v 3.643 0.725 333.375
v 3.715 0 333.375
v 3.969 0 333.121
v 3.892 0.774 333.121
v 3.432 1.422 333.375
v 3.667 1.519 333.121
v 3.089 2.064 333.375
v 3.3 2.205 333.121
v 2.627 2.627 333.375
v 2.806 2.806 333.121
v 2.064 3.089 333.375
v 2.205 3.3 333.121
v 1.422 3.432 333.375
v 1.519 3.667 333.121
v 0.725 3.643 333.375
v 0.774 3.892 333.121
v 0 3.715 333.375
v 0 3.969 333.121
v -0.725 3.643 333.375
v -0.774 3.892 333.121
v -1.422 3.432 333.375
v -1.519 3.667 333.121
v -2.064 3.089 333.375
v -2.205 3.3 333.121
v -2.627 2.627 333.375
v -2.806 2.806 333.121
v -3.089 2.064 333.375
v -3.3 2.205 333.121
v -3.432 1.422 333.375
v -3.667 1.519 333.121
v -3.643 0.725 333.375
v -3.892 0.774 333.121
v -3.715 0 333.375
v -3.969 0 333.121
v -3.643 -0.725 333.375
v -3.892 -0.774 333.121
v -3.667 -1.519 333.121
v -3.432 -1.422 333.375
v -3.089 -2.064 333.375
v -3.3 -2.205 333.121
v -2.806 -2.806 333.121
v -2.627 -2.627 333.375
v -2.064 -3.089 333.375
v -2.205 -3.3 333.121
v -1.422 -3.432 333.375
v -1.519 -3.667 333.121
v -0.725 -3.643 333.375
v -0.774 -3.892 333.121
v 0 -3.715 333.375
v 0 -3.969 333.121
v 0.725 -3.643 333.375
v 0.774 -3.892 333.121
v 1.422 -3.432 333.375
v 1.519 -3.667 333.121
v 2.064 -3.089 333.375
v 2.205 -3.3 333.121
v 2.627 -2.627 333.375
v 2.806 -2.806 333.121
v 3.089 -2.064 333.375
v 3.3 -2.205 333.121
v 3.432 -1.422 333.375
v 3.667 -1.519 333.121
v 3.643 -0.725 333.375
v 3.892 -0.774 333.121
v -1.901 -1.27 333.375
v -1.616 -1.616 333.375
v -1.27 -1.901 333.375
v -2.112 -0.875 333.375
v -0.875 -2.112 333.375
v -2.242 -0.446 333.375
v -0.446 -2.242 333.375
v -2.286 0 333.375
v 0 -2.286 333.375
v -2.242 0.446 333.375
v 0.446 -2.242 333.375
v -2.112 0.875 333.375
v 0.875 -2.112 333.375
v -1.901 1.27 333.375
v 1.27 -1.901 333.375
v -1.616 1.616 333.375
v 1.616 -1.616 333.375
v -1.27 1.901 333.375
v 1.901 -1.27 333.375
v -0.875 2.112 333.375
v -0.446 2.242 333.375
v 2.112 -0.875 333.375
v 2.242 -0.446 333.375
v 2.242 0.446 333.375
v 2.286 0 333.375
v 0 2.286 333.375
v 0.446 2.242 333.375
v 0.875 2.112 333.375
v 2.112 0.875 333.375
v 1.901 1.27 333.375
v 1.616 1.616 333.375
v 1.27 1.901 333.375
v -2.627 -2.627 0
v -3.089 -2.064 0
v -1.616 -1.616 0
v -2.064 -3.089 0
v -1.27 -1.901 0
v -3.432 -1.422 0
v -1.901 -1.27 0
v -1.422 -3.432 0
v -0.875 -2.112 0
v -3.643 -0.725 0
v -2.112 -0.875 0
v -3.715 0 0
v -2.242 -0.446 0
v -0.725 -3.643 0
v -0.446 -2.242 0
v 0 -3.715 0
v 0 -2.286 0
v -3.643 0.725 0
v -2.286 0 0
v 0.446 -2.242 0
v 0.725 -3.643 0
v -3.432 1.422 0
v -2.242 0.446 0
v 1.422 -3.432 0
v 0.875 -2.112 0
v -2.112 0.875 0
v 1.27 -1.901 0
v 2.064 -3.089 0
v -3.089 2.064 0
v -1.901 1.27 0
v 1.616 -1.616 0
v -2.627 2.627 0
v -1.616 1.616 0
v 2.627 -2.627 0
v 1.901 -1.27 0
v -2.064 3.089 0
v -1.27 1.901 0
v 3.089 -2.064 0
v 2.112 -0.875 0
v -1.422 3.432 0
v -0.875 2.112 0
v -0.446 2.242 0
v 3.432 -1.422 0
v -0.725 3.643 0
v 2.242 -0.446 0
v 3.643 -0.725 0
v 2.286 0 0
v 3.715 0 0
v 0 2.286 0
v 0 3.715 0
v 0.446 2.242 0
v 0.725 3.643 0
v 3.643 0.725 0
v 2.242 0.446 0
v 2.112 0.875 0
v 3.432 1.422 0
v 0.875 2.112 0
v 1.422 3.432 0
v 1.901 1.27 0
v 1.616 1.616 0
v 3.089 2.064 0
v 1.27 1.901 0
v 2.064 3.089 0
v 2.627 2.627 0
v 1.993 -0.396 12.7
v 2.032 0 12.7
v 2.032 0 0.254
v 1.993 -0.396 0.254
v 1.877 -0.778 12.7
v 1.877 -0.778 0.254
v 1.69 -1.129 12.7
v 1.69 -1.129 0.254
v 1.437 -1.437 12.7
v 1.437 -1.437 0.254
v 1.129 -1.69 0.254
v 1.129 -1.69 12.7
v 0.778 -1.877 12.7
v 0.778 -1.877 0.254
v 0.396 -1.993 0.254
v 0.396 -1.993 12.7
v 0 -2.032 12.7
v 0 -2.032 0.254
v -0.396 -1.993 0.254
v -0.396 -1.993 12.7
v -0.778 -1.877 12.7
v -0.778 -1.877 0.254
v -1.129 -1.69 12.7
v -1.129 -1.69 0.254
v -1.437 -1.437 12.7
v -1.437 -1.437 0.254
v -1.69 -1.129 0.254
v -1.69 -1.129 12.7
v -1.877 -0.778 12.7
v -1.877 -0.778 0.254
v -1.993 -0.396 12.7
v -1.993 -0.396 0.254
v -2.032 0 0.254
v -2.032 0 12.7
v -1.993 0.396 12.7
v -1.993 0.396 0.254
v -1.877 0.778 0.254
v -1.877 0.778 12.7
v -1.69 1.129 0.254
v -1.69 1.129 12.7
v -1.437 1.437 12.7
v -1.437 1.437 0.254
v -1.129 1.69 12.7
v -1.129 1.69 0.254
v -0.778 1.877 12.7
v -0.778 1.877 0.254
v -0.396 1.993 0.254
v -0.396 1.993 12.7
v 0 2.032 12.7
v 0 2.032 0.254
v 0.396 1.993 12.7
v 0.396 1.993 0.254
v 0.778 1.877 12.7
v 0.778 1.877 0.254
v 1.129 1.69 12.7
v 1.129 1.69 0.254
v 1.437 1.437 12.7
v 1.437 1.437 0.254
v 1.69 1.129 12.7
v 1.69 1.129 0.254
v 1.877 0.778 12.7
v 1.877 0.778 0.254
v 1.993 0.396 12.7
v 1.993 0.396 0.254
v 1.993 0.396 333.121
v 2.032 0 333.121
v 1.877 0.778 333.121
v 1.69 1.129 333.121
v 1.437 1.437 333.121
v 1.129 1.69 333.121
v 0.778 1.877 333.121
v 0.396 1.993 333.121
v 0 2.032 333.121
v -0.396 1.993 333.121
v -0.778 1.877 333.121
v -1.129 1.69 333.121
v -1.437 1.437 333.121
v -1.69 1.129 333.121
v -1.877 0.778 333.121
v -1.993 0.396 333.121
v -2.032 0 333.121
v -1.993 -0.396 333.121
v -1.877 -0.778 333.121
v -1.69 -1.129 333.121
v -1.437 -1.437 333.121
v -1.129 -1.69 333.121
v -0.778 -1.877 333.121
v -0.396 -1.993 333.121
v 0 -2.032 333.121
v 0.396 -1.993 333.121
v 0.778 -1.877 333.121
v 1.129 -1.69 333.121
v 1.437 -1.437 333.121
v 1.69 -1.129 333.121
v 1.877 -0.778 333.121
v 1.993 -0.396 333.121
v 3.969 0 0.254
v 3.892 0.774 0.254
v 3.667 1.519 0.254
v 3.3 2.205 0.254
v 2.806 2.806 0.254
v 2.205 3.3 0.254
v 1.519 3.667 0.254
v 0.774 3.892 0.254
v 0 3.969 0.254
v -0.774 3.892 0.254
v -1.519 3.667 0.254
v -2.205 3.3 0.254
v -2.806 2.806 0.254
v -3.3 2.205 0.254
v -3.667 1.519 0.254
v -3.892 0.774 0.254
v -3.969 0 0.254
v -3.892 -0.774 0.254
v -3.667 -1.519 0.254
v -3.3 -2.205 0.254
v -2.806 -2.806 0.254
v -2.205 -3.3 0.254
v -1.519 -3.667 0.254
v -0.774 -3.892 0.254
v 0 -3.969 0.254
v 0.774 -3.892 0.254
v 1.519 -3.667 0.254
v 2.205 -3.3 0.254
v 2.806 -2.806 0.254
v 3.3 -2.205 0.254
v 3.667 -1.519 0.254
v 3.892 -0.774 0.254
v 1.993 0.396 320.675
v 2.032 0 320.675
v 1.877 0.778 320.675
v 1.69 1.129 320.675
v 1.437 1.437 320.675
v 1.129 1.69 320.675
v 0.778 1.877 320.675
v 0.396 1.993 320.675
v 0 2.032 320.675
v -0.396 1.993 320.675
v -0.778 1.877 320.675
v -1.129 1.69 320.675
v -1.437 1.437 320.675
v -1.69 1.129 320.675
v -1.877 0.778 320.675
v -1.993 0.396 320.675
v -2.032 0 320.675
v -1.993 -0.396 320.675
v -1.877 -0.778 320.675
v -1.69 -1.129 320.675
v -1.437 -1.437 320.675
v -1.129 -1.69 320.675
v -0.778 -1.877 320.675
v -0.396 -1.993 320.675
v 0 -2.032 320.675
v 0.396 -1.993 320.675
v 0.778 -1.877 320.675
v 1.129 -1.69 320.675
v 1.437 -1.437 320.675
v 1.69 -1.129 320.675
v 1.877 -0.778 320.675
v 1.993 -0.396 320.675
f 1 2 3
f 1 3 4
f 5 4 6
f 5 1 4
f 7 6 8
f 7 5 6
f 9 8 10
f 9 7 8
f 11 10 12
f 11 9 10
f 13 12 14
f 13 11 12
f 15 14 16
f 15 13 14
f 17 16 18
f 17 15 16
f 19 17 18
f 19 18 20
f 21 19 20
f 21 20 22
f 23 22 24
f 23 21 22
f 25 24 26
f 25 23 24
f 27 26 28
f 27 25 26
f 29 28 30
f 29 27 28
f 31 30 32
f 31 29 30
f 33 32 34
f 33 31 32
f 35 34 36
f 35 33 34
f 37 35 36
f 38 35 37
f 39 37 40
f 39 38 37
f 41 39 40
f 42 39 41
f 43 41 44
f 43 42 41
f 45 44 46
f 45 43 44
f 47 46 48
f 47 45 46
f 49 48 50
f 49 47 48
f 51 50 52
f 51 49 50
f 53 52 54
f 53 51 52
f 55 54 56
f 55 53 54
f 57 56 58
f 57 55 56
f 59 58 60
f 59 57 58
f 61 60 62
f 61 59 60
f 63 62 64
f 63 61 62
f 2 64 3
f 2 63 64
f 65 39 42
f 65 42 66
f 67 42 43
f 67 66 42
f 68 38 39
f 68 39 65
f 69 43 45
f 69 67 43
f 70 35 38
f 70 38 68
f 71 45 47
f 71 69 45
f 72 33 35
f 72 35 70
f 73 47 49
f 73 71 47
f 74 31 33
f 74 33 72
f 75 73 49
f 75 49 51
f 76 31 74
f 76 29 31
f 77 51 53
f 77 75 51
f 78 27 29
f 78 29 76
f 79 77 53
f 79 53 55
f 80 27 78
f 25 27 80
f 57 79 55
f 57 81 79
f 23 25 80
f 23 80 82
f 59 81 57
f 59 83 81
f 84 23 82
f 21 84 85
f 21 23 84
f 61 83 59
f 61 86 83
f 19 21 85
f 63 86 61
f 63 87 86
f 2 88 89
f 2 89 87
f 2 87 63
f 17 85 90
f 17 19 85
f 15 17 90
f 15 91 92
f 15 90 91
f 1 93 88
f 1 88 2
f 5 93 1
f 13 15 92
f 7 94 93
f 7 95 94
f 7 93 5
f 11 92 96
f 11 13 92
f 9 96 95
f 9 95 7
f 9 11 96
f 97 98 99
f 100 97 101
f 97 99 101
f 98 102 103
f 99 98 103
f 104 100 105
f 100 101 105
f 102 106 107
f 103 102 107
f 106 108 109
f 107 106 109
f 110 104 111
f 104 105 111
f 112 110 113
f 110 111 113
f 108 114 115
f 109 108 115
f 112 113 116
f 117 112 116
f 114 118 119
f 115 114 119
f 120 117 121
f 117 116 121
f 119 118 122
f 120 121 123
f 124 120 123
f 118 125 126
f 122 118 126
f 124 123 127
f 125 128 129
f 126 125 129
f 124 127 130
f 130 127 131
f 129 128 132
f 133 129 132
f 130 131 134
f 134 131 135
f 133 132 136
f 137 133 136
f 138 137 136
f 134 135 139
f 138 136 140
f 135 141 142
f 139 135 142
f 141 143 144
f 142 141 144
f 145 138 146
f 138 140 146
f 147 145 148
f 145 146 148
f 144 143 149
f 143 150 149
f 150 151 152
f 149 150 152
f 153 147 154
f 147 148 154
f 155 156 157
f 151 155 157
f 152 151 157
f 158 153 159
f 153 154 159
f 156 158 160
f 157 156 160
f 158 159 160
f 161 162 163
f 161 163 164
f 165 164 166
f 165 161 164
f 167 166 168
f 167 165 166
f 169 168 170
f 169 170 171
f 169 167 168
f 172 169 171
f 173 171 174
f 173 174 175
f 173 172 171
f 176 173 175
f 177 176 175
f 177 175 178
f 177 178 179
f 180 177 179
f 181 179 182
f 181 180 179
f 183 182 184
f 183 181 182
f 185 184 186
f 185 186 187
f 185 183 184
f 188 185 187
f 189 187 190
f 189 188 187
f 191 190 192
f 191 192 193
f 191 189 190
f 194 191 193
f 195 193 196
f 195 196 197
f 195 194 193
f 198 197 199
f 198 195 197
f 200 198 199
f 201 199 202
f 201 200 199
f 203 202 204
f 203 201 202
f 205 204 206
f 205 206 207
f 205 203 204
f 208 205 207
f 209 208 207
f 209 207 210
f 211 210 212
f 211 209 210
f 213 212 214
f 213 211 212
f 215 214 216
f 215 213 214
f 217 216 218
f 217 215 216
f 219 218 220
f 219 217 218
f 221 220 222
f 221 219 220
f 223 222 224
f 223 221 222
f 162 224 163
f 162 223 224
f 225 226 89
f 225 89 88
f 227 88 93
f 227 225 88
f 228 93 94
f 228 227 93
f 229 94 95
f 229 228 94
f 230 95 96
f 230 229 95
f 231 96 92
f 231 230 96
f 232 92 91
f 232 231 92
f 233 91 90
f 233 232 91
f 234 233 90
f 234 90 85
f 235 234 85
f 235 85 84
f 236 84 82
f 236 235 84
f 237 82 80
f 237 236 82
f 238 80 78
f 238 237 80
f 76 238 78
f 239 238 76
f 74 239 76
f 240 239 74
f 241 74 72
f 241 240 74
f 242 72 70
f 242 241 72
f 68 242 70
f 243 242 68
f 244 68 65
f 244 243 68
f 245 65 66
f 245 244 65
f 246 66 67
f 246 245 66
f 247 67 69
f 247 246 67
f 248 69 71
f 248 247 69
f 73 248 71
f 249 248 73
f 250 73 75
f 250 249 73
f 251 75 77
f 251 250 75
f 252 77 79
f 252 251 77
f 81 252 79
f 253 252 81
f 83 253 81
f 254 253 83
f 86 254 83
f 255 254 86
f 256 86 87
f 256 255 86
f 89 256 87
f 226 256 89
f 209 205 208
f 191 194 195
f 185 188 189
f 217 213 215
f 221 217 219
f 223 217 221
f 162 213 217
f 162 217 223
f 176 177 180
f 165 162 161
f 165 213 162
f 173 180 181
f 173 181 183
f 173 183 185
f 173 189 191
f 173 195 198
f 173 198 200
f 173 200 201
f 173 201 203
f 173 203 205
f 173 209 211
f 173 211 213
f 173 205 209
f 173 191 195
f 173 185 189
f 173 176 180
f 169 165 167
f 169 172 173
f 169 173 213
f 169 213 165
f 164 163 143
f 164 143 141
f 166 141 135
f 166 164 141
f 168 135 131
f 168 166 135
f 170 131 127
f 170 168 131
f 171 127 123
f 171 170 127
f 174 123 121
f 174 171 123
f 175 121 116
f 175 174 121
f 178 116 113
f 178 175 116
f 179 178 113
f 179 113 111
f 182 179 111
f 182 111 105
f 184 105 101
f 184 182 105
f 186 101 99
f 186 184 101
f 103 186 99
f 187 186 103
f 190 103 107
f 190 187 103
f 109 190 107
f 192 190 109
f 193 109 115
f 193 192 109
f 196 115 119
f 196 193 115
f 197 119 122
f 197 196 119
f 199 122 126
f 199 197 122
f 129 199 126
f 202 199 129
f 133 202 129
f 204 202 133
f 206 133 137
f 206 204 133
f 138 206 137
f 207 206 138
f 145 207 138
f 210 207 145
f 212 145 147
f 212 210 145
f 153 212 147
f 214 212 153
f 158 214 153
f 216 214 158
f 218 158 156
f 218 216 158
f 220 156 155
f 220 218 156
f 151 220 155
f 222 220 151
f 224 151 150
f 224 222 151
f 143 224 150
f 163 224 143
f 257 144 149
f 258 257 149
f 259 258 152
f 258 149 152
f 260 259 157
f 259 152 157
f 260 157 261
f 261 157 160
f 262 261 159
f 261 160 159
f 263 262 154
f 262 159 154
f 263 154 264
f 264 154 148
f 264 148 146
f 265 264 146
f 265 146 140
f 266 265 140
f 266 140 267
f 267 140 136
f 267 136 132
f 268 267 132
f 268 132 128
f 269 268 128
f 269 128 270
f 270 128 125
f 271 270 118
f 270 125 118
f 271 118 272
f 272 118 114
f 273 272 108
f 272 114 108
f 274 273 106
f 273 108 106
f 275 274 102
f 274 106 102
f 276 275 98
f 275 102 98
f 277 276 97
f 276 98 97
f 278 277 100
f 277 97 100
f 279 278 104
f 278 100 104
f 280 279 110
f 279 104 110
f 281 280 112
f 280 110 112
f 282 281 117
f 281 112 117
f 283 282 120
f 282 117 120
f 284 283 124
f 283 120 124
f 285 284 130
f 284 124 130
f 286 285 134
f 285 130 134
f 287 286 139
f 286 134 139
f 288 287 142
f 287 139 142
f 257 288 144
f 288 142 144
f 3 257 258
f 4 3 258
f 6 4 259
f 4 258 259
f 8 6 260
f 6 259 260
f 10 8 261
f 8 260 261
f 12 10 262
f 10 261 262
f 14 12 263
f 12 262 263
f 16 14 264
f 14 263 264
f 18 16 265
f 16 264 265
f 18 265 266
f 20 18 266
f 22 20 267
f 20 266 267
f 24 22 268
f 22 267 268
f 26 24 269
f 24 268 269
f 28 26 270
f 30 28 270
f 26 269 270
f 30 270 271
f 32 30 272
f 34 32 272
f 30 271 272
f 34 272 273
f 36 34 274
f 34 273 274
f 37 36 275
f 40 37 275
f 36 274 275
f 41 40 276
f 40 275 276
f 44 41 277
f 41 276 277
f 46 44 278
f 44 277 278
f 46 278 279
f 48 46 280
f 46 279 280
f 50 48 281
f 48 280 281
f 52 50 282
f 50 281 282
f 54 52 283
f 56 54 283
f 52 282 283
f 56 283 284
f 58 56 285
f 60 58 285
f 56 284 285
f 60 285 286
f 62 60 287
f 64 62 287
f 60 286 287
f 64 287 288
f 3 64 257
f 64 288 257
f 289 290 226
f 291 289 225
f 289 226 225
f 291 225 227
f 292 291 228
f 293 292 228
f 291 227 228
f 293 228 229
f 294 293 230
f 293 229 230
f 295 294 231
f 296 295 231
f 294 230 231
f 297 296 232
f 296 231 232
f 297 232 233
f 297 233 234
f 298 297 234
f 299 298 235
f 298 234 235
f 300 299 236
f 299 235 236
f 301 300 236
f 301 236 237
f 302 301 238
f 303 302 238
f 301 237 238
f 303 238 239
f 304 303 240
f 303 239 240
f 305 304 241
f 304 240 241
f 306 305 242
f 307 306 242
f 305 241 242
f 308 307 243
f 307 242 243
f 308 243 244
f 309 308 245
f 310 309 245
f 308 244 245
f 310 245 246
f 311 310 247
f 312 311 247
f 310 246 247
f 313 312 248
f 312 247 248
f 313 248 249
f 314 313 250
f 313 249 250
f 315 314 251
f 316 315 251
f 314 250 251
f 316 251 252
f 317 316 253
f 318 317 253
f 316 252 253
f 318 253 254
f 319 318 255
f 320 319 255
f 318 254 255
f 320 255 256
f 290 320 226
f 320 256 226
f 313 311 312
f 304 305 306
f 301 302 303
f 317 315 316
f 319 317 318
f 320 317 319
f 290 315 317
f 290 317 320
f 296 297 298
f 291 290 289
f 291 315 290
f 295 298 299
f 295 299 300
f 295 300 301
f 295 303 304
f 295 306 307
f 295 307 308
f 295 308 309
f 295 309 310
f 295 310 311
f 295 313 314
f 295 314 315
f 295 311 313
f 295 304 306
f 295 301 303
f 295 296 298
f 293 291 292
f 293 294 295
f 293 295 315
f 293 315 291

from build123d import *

# Parameters (mm, degrees)
SKETCH1_R           = 3.96875
BOSS_EXTRUDE1_DEPTH = 333.375
SKETCH2_R           = 2.032
CUT_EXTRUDE1_DEPTH  = 12.7
CUT_EXTRUDE2_START  = -12.7
SKETCH3_R           = 2.032
CUT_EXTRUDE2_DEPTH  = 12.7
CHAMFER1_SIZE       = 0.254


with BuildPart() as part:
    # Sketch1 → Boss-Extrude1 (new body)
    with BuildSketch(Plane.XY):
        Circle(SKETCH1_R)
    extrude(amount=BOSS_EXTRUDE1_DEPTH)

    # Sketch2 → Cut-Extrude1 (cut)
    with BuildSketch(Plane.XY.offset(333.375)):
        Circle(SKETCH2_R)
    extrude(amount=-CUT_EXTRUDE1_DEPTH, mode=Mode.SUBTRACT)

    # Sketch3 → Cut-Extrude2 (cut)
    with BuildSketch(Plane(origin=(0, 0, 0), x_dir=(-1, 0, 0), z_dir=(0, 0, -1)).offset(CUT_EXTRUDE2_START)):
        with Locations(Location((0, 0, 0), (0, 0, 180))):
            Circle(SKETCH3_R)
    extrude(amount=CUT_EXTRUDE2_DEPTH, mode=Mode.SUBTRACT)

    # Chamfer1
    chamfer1_edges = [part.edges().sort_by_distance(p)[0] for p in [
        (-2.032, 0, 0),
        (-3.96875, 0, 0),
        (-3.96875, 0, 333.375),
        (-2.032, 0, 333.375),
    ]]
    chamfer(chamfer1_edges, length=CHAMFER1_SIZE)


solid = part.part
